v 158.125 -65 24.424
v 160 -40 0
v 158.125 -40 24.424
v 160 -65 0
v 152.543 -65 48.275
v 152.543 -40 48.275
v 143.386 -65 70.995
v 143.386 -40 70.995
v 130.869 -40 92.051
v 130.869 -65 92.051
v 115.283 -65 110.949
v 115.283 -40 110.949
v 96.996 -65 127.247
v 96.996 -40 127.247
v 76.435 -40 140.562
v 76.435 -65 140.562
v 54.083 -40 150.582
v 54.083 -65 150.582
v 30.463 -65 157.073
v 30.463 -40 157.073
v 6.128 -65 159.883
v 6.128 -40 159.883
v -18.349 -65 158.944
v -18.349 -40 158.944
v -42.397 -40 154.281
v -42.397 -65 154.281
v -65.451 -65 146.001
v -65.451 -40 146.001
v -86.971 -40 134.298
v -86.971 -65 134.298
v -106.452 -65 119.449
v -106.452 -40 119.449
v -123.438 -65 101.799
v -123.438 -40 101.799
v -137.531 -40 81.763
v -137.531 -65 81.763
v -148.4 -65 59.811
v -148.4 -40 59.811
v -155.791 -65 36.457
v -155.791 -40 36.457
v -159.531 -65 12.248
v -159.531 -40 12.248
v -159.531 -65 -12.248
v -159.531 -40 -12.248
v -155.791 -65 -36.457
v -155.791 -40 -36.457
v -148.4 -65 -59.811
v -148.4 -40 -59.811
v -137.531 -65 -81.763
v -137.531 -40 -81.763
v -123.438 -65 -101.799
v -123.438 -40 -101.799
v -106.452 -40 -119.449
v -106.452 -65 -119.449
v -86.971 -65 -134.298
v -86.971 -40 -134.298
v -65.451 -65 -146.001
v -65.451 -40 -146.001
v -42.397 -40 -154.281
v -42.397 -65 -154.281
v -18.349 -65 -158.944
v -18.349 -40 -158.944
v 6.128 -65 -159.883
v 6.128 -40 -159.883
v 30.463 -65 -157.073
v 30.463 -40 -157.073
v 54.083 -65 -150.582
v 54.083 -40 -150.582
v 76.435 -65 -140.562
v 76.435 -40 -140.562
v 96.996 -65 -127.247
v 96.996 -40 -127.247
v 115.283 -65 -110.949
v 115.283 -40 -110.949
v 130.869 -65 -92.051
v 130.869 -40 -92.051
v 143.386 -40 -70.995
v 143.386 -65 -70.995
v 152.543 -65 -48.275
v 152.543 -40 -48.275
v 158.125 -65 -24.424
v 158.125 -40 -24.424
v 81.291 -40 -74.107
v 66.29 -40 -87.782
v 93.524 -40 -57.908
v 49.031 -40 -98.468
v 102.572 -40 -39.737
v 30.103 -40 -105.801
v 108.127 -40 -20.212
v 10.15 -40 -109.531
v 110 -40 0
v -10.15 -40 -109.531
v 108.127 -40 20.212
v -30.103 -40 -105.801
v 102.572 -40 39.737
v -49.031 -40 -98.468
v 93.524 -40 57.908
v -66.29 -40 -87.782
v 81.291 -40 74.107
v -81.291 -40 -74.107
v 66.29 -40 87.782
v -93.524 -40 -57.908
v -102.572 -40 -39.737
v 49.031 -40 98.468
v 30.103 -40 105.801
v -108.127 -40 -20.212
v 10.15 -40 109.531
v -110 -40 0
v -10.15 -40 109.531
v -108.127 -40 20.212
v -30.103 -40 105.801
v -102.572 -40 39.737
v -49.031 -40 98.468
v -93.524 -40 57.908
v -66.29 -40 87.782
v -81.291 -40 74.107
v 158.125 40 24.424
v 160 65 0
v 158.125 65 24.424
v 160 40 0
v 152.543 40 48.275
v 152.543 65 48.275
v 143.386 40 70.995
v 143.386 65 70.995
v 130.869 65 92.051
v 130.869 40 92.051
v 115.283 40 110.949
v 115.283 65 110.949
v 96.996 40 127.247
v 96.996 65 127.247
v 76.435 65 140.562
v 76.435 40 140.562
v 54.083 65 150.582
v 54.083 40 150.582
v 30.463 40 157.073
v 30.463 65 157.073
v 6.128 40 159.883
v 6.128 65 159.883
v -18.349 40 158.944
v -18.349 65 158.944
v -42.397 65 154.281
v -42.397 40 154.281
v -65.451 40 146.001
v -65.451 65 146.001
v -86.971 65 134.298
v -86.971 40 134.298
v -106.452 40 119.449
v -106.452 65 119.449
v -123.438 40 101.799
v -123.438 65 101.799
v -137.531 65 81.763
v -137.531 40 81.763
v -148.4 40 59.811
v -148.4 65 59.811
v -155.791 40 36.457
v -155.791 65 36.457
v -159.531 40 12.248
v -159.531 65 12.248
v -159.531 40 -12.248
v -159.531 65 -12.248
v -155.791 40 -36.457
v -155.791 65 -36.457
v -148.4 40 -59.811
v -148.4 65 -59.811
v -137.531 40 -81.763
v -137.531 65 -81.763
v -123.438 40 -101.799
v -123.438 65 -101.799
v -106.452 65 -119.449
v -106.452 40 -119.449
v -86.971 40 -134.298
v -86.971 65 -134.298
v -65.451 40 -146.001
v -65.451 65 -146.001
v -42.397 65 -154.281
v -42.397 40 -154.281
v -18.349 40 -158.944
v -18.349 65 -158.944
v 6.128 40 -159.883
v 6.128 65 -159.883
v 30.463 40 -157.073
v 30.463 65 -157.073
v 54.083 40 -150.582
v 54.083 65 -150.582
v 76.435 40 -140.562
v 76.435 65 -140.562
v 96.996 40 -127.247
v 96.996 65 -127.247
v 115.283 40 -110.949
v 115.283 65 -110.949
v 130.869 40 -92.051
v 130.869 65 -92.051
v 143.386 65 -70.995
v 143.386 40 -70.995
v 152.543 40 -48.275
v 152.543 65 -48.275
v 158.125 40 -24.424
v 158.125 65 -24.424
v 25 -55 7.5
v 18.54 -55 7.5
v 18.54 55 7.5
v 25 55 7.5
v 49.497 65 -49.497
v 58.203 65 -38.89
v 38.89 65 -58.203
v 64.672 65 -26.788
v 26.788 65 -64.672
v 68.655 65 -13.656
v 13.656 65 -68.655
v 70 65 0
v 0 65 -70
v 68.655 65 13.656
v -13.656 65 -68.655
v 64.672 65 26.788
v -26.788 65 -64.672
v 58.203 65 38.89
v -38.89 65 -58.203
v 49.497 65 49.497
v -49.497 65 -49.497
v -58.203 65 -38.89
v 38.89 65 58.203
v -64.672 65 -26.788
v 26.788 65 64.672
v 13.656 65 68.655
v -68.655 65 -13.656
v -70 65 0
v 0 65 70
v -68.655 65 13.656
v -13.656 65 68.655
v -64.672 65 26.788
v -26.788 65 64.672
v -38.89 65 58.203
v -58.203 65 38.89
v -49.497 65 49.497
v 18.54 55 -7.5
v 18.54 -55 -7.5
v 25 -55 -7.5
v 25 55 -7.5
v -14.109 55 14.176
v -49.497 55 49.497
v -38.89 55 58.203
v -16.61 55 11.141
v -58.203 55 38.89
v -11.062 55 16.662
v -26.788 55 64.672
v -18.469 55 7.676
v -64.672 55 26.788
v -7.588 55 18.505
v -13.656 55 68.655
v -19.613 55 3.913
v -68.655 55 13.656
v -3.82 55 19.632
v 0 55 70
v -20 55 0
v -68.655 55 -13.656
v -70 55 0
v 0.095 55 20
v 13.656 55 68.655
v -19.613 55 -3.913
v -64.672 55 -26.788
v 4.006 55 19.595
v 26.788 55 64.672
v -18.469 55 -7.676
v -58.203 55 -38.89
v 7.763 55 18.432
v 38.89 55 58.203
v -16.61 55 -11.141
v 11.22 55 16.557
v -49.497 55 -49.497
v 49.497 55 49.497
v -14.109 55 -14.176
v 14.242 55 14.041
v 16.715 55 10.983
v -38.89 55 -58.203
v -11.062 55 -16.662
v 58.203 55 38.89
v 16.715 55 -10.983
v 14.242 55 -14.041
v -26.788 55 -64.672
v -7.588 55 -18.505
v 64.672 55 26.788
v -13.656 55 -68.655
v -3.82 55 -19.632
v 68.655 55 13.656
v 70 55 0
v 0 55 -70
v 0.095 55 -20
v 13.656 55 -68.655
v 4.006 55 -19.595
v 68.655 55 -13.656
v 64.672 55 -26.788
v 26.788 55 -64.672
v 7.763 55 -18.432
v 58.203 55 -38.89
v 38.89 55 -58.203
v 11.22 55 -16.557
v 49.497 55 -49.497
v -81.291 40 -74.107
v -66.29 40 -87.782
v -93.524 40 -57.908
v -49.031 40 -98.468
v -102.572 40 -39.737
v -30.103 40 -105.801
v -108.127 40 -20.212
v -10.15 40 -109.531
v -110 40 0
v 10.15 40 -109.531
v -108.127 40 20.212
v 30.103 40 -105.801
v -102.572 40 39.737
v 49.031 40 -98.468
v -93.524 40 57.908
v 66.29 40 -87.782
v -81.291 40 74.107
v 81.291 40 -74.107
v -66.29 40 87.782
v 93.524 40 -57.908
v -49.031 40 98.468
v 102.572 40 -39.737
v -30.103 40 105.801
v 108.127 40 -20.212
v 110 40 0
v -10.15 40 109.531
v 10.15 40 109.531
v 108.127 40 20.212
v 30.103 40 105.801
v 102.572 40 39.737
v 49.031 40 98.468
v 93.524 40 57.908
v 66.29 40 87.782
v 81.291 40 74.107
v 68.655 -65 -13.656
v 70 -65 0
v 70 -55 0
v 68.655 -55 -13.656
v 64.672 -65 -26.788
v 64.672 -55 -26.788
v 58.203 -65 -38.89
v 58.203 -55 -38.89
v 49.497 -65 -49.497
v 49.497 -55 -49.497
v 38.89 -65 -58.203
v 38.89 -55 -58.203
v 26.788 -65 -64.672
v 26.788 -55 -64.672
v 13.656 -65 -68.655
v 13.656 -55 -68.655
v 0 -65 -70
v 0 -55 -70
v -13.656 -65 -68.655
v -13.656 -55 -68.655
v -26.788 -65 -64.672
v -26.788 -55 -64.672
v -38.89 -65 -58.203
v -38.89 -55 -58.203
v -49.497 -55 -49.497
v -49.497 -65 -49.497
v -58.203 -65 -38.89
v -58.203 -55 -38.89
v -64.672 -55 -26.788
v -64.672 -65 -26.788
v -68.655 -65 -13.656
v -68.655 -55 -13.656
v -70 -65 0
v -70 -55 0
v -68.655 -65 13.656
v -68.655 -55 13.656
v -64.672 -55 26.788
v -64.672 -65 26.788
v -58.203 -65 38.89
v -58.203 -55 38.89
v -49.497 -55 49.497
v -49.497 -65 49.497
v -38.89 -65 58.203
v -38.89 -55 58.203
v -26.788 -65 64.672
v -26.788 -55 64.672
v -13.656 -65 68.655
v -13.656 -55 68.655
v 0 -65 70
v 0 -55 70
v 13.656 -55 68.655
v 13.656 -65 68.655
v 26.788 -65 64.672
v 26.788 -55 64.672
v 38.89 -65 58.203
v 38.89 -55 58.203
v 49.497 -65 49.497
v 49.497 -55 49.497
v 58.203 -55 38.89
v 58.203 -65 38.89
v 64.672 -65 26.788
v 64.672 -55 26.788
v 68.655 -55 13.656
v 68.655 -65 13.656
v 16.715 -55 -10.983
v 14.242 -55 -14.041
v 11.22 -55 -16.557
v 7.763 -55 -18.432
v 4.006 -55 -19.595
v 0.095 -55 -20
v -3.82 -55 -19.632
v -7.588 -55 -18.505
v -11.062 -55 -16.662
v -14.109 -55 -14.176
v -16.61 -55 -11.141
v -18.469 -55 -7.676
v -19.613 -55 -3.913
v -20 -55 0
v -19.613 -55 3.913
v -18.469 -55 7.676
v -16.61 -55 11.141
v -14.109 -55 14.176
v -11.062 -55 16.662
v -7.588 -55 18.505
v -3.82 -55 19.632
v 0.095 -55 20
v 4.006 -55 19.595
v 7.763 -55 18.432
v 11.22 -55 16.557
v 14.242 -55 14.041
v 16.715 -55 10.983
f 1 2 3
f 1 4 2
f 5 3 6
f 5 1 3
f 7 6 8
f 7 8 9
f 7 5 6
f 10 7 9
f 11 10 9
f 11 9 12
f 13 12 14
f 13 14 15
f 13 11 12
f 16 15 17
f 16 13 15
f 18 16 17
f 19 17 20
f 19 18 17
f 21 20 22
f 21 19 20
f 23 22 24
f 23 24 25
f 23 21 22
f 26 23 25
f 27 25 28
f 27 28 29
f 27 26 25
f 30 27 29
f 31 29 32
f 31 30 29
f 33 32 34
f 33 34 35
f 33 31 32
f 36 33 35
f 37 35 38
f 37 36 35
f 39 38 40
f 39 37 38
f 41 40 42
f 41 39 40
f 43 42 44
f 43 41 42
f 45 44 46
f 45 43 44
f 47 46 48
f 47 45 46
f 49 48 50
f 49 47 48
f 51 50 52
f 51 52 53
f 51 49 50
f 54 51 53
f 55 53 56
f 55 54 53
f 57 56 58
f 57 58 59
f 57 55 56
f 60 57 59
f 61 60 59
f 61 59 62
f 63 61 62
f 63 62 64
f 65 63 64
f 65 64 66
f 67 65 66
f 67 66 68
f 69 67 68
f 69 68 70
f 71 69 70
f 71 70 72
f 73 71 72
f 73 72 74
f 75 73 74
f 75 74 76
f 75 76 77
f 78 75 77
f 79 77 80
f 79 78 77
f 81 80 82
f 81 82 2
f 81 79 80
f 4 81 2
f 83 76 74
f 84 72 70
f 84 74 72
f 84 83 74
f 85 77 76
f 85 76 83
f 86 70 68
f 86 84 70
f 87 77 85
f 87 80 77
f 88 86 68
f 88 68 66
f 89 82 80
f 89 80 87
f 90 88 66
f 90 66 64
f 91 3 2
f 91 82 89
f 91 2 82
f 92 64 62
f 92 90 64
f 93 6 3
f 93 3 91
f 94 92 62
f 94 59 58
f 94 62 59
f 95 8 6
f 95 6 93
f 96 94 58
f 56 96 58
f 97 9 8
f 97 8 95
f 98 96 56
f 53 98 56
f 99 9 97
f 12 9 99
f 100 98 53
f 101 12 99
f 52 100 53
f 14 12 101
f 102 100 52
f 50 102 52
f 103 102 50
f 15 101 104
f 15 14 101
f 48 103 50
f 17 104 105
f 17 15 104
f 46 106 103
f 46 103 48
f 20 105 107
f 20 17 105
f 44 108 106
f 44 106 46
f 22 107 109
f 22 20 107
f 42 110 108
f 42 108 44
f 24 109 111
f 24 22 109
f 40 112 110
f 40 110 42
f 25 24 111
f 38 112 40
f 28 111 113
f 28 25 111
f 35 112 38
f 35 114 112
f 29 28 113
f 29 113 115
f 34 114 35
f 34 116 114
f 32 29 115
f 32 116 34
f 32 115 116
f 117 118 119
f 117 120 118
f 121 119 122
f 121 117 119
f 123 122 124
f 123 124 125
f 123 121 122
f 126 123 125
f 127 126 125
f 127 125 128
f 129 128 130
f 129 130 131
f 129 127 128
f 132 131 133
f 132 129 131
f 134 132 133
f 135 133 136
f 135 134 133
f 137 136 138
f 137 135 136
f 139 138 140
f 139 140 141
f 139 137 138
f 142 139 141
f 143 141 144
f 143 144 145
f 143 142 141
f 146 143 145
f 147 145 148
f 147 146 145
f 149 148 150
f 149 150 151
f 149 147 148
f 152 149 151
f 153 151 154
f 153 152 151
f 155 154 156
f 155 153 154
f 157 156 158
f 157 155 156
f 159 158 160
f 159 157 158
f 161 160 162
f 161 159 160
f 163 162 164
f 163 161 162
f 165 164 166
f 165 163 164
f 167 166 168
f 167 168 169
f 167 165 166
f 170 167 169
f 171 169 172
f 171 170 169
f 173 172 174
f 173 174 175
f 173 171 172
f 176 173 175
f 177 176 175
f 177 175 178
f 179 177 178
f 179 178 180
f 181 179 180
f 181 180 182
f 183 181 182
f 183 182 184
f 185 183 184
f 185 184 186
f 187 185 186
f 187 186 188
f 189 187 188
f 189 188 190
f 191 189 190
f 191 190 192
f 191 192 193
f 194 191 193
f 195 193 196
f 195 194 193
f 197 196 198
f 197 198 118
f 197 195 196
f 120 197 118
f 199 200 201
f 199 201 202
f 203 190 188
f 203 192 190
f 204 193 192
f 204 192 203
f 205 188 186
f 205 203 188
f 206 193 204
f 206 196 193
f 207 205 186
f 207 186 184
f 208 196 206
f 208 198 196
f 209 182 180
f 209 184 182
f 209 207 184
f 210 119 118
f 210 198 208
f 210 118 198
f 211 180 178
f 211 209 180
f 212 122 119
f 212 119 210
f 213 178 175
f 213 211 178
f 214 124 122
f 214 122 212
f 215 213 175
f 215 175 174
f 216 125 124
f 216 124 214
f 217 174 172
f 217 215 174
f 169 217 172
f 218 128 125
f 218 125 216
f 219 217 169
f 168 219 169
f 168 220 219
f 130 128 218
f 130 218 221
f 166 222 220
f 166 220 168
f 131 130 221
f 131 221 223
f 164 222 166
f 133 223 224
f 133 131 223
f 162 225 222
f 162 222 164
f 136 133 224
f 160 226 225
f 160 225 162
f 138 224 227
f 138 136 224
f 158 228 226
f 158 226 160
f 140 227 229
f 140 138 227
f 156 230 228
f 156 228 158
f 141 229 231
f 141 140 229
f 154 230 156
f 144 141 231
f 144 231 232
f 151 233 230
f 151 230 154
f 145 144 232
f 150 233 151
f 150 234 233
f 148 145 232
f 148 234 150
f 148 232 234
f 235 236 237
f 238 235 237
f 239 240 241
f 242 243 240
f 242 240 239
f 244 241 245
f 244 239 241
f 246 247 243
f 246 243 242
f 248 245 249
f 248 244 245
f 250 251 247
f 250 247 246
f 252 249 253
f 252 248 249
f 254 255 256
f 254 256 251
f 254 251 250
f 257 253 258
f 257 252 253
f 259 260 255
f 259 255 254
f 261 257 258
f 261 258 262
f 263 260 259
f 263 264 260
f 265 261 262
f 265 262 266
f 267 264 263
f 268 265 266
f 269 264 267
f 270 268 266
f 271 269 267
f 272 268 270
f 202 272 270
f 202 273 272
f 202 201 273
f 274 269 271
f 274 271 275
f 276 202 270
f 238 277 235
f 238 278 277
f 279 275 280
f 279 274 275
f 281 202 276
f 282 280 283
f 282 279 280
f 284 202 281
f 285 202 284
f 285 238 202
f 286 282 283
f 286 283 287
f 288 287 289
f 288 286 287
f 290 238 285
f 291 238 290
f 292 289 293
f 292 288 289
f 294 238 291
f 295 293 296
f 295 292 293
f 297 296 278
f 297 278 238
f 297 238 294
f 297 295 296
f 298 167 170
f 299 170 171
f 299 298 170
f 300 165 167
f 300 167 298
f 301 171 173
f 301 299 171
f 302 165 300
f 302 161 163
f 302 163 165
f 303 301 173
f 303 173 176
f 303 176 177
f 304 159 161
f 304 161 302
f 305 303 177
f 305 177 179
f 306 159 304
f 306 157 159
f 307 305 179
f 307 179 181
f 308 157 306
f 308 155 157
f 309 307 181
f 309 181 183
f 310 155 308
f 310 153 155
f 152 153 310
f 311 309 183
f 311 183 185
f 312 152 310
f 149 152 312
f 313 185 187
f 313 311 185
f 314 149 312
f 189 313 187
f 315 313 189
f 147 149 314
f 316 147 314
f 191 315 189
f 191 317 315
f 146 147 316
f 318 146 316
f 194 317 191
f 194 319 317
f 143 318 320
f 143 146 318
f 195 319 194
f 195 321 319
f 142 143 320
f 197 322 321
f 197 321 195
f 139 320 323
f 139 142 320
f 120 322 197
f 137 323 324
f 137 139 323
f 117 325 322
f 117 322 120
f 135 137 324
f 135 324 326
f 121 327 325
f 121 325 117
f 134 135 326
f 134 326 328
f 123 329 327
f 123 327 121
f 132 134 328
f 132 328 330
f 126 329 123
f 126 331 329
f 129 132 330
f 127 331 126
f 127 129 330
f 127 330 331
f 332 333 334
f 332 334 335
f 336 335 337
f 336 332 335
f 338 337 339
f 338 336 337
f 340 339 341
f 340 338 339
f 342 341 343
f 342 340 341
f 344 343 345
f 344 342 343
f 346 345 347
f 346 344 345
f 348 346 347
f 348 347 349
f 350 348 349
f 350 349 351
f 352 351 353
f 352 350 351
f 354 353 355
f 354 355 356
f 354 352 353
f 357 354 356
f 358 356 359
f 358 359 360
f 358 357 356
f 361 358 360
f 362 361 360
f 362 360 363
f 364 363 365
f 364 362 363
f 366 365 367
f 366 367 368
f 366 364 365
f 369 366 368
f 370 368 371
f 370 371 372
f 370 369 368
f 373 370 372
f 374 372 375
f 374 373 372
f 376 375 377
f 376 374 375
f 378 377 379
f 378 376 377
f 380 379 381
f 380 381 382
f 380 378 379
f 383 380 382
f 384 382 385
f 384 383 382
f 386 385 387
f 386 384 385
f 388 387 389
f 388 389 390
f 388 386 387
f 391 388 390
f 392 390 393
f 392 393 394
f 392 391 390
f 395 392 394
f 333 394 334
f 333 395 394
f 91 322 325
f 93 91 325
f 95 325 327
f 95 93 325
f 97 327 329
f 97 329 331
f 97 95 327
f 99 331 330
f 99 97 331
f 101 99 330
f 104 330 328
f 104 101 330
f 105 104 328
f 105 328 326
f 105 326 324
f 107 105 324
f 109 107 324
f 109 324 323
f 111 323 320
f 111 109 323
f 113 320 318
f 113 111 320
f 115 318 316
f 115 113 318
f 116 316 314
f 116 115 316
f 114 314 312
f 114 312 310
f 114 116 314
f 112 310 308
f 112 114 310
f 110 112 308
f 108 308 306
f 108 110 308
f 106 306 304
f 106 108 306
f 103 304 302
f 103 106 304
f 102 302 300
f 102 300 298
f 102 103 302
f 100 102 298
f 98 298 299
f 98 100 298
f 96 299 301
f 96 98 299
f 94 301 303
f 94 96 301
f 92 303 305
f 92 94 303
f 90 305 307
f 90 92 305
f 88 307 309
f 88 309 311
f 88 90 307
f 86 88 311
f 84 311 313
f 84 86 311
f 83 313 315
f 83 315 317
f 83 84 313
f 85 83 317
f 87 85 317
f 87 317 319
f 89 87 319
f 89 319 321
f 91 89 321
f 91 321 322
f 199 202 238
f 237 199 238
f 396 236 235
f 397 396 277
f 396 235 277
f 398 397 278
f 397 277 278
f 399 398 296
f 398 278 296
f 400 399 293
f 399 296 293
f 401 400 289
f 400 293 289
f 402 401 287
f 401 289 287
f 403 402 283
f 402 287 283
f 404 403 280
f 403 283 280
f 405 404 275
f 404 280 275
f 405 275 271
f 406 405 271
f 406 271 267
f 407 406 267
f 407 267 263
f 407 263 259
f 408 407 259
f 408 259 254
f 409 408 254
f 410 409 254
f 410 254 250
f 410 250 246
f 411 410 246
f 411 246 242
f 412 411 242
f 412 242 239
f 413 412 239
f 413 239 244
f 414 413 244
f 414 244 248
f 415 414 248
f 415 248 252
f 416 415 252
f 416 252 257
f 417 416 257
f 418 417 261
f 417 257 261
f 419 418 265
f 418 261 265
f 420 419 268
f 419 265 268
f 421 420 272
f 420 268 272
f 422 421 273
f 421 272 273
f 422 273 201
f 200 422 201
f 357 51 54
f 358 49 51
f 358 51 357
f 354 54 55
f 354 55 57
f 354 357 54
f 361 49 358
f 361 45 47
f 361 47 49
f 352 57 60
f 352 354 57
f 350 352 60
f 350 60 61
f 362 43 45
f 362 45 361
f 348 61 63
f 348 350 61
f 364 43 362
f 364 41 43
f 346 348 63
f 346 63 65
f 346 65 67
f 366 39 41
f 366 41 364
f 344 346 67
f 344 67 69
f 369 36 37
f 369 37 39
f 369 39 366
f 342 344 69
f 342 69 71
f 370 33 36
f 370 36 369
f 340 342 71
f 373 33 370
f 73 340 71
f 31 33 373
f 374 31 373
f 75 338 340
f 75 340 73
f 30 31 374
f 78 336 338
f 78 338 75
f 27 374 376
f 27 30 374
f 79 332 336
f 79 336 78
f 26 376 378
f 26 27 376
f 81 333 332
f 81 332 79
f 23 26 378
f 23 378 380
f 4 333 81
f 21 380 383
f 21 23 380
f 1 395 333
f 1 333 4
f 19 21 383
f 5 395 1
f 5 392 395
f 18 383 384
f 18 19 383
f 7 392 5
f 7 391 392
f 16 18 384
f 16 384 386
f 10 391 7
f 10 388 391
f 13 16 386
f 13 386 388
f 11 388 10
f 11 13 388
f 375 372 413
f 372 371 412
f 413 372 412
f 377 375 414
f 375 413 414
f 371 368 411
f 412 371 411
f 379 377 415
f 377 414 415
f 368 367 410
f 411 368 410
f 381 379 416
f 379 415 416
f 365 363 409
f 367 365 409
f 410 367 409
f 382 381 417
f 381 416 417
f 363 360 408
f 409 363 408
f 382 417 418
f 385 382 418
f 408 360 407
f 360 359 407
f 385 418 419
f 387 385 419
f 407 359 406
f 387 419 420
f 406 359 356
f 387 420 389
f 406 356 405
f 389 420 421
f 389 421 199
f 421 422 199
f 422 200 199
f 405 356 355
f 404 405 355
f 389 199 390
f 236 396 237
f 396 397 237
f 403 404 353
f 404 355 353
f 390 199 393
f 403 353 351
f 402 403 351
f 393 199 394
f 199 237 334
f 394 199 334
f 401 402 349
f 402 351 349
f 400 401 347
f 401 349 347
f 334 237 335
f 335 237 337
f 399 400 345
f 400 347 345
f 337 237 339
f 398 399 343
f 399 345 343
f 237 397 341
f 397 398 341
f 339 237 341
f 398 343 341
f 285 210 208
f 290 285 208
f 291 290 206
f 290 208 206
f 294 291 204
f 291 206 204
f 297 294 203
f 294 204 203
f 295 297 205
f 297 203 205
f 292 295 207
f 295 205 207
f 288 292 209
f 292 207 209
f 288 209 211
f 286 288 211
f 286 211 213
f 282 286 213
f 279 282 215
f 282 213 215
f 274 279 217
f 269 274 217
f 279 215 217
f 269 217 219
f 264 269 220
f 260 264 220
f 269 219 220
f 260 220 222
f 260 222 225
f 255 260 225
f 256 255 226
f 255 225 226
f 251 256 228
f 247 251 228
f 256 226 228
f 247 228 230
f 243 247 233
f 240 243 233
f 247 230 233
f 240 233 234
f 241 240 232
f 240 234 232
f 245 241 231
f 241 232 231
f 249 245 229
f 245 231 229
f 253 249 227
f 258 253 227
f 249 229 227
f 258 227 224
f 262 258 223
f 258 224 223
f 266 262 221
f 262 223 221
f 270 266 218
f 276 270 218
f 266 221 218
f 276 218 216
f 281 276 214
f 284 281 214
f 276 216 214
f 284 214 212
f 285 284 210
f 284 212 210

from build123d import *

# Parameters (mm, degrees)
SKETCH2_R          = 70
CUT_EXTRUDE1_DEPTH = 10
SKETCH3_R          = 20
CUT_EXTRUDE2_DEPTH = 121
SKETCH4_W          = 19.454924149
SKETCH4_H          = 15
CUT_EXTRUDE3_DEPTH = 121


with BuildPart() as part:
    # Sketch1 → Revolve1 (revolve)
    with BuildSketch(Plane.XY):
        Polygon((0, 65), (160, 65), (160, 40), (110, 40), (110, -40), (160, -40), (160, -65), (0, -65), align=None)
    revolve(axis=Axis((0, 93.810810811, 0), (0, -1, 0)))

    # Sketch2 → Cut-Extrude1 (cut)
    with BuildSketch(Plane(origin=(0, 65, 0), x_dir=(1, 0, 0), z_dir=(0, 1, 0))):
        Circle(SKETCH2_R)
    cut_extrude1 = extrude(amount=-CUT_EXTRUDE1_DEPTH, mode=Mode.SUBTRACT)

    # Mirror1: Cut-Extrude1 across plane
    add(cut_extrude1.mirror(Plane.ZX), mode=Mode.SUBTRACT)

    # Sketch3 → Cut-Extrude2 (cut, through all)
    with BuildSketch(Plane(origin=(0, 55, 0), x_dir=(1, 0, 0), z_dir=(0, 1, 0))):
        Circle(SKETCH3_R)
    extrude(amount=-CUT_EXTRUDE2_DEPTH, mode=Mode.SUBTRACT)

    # Sketch4 → Cut-Extrude3 (cut, through all)
    with BuildSketch(Plane(origin=(0, 55, 0), x_dir=(1, 0, 0), z_dir=(0, 1, 0))):
        with Locations((15.272537926, 0)):
            Rectangle(SKETCH4_W, SKETCH4_H)
    extrude(amount=-CUT_EXTRUDE3_DEPTH, mode=Mode.SUBTRACT)


solid = part.part
